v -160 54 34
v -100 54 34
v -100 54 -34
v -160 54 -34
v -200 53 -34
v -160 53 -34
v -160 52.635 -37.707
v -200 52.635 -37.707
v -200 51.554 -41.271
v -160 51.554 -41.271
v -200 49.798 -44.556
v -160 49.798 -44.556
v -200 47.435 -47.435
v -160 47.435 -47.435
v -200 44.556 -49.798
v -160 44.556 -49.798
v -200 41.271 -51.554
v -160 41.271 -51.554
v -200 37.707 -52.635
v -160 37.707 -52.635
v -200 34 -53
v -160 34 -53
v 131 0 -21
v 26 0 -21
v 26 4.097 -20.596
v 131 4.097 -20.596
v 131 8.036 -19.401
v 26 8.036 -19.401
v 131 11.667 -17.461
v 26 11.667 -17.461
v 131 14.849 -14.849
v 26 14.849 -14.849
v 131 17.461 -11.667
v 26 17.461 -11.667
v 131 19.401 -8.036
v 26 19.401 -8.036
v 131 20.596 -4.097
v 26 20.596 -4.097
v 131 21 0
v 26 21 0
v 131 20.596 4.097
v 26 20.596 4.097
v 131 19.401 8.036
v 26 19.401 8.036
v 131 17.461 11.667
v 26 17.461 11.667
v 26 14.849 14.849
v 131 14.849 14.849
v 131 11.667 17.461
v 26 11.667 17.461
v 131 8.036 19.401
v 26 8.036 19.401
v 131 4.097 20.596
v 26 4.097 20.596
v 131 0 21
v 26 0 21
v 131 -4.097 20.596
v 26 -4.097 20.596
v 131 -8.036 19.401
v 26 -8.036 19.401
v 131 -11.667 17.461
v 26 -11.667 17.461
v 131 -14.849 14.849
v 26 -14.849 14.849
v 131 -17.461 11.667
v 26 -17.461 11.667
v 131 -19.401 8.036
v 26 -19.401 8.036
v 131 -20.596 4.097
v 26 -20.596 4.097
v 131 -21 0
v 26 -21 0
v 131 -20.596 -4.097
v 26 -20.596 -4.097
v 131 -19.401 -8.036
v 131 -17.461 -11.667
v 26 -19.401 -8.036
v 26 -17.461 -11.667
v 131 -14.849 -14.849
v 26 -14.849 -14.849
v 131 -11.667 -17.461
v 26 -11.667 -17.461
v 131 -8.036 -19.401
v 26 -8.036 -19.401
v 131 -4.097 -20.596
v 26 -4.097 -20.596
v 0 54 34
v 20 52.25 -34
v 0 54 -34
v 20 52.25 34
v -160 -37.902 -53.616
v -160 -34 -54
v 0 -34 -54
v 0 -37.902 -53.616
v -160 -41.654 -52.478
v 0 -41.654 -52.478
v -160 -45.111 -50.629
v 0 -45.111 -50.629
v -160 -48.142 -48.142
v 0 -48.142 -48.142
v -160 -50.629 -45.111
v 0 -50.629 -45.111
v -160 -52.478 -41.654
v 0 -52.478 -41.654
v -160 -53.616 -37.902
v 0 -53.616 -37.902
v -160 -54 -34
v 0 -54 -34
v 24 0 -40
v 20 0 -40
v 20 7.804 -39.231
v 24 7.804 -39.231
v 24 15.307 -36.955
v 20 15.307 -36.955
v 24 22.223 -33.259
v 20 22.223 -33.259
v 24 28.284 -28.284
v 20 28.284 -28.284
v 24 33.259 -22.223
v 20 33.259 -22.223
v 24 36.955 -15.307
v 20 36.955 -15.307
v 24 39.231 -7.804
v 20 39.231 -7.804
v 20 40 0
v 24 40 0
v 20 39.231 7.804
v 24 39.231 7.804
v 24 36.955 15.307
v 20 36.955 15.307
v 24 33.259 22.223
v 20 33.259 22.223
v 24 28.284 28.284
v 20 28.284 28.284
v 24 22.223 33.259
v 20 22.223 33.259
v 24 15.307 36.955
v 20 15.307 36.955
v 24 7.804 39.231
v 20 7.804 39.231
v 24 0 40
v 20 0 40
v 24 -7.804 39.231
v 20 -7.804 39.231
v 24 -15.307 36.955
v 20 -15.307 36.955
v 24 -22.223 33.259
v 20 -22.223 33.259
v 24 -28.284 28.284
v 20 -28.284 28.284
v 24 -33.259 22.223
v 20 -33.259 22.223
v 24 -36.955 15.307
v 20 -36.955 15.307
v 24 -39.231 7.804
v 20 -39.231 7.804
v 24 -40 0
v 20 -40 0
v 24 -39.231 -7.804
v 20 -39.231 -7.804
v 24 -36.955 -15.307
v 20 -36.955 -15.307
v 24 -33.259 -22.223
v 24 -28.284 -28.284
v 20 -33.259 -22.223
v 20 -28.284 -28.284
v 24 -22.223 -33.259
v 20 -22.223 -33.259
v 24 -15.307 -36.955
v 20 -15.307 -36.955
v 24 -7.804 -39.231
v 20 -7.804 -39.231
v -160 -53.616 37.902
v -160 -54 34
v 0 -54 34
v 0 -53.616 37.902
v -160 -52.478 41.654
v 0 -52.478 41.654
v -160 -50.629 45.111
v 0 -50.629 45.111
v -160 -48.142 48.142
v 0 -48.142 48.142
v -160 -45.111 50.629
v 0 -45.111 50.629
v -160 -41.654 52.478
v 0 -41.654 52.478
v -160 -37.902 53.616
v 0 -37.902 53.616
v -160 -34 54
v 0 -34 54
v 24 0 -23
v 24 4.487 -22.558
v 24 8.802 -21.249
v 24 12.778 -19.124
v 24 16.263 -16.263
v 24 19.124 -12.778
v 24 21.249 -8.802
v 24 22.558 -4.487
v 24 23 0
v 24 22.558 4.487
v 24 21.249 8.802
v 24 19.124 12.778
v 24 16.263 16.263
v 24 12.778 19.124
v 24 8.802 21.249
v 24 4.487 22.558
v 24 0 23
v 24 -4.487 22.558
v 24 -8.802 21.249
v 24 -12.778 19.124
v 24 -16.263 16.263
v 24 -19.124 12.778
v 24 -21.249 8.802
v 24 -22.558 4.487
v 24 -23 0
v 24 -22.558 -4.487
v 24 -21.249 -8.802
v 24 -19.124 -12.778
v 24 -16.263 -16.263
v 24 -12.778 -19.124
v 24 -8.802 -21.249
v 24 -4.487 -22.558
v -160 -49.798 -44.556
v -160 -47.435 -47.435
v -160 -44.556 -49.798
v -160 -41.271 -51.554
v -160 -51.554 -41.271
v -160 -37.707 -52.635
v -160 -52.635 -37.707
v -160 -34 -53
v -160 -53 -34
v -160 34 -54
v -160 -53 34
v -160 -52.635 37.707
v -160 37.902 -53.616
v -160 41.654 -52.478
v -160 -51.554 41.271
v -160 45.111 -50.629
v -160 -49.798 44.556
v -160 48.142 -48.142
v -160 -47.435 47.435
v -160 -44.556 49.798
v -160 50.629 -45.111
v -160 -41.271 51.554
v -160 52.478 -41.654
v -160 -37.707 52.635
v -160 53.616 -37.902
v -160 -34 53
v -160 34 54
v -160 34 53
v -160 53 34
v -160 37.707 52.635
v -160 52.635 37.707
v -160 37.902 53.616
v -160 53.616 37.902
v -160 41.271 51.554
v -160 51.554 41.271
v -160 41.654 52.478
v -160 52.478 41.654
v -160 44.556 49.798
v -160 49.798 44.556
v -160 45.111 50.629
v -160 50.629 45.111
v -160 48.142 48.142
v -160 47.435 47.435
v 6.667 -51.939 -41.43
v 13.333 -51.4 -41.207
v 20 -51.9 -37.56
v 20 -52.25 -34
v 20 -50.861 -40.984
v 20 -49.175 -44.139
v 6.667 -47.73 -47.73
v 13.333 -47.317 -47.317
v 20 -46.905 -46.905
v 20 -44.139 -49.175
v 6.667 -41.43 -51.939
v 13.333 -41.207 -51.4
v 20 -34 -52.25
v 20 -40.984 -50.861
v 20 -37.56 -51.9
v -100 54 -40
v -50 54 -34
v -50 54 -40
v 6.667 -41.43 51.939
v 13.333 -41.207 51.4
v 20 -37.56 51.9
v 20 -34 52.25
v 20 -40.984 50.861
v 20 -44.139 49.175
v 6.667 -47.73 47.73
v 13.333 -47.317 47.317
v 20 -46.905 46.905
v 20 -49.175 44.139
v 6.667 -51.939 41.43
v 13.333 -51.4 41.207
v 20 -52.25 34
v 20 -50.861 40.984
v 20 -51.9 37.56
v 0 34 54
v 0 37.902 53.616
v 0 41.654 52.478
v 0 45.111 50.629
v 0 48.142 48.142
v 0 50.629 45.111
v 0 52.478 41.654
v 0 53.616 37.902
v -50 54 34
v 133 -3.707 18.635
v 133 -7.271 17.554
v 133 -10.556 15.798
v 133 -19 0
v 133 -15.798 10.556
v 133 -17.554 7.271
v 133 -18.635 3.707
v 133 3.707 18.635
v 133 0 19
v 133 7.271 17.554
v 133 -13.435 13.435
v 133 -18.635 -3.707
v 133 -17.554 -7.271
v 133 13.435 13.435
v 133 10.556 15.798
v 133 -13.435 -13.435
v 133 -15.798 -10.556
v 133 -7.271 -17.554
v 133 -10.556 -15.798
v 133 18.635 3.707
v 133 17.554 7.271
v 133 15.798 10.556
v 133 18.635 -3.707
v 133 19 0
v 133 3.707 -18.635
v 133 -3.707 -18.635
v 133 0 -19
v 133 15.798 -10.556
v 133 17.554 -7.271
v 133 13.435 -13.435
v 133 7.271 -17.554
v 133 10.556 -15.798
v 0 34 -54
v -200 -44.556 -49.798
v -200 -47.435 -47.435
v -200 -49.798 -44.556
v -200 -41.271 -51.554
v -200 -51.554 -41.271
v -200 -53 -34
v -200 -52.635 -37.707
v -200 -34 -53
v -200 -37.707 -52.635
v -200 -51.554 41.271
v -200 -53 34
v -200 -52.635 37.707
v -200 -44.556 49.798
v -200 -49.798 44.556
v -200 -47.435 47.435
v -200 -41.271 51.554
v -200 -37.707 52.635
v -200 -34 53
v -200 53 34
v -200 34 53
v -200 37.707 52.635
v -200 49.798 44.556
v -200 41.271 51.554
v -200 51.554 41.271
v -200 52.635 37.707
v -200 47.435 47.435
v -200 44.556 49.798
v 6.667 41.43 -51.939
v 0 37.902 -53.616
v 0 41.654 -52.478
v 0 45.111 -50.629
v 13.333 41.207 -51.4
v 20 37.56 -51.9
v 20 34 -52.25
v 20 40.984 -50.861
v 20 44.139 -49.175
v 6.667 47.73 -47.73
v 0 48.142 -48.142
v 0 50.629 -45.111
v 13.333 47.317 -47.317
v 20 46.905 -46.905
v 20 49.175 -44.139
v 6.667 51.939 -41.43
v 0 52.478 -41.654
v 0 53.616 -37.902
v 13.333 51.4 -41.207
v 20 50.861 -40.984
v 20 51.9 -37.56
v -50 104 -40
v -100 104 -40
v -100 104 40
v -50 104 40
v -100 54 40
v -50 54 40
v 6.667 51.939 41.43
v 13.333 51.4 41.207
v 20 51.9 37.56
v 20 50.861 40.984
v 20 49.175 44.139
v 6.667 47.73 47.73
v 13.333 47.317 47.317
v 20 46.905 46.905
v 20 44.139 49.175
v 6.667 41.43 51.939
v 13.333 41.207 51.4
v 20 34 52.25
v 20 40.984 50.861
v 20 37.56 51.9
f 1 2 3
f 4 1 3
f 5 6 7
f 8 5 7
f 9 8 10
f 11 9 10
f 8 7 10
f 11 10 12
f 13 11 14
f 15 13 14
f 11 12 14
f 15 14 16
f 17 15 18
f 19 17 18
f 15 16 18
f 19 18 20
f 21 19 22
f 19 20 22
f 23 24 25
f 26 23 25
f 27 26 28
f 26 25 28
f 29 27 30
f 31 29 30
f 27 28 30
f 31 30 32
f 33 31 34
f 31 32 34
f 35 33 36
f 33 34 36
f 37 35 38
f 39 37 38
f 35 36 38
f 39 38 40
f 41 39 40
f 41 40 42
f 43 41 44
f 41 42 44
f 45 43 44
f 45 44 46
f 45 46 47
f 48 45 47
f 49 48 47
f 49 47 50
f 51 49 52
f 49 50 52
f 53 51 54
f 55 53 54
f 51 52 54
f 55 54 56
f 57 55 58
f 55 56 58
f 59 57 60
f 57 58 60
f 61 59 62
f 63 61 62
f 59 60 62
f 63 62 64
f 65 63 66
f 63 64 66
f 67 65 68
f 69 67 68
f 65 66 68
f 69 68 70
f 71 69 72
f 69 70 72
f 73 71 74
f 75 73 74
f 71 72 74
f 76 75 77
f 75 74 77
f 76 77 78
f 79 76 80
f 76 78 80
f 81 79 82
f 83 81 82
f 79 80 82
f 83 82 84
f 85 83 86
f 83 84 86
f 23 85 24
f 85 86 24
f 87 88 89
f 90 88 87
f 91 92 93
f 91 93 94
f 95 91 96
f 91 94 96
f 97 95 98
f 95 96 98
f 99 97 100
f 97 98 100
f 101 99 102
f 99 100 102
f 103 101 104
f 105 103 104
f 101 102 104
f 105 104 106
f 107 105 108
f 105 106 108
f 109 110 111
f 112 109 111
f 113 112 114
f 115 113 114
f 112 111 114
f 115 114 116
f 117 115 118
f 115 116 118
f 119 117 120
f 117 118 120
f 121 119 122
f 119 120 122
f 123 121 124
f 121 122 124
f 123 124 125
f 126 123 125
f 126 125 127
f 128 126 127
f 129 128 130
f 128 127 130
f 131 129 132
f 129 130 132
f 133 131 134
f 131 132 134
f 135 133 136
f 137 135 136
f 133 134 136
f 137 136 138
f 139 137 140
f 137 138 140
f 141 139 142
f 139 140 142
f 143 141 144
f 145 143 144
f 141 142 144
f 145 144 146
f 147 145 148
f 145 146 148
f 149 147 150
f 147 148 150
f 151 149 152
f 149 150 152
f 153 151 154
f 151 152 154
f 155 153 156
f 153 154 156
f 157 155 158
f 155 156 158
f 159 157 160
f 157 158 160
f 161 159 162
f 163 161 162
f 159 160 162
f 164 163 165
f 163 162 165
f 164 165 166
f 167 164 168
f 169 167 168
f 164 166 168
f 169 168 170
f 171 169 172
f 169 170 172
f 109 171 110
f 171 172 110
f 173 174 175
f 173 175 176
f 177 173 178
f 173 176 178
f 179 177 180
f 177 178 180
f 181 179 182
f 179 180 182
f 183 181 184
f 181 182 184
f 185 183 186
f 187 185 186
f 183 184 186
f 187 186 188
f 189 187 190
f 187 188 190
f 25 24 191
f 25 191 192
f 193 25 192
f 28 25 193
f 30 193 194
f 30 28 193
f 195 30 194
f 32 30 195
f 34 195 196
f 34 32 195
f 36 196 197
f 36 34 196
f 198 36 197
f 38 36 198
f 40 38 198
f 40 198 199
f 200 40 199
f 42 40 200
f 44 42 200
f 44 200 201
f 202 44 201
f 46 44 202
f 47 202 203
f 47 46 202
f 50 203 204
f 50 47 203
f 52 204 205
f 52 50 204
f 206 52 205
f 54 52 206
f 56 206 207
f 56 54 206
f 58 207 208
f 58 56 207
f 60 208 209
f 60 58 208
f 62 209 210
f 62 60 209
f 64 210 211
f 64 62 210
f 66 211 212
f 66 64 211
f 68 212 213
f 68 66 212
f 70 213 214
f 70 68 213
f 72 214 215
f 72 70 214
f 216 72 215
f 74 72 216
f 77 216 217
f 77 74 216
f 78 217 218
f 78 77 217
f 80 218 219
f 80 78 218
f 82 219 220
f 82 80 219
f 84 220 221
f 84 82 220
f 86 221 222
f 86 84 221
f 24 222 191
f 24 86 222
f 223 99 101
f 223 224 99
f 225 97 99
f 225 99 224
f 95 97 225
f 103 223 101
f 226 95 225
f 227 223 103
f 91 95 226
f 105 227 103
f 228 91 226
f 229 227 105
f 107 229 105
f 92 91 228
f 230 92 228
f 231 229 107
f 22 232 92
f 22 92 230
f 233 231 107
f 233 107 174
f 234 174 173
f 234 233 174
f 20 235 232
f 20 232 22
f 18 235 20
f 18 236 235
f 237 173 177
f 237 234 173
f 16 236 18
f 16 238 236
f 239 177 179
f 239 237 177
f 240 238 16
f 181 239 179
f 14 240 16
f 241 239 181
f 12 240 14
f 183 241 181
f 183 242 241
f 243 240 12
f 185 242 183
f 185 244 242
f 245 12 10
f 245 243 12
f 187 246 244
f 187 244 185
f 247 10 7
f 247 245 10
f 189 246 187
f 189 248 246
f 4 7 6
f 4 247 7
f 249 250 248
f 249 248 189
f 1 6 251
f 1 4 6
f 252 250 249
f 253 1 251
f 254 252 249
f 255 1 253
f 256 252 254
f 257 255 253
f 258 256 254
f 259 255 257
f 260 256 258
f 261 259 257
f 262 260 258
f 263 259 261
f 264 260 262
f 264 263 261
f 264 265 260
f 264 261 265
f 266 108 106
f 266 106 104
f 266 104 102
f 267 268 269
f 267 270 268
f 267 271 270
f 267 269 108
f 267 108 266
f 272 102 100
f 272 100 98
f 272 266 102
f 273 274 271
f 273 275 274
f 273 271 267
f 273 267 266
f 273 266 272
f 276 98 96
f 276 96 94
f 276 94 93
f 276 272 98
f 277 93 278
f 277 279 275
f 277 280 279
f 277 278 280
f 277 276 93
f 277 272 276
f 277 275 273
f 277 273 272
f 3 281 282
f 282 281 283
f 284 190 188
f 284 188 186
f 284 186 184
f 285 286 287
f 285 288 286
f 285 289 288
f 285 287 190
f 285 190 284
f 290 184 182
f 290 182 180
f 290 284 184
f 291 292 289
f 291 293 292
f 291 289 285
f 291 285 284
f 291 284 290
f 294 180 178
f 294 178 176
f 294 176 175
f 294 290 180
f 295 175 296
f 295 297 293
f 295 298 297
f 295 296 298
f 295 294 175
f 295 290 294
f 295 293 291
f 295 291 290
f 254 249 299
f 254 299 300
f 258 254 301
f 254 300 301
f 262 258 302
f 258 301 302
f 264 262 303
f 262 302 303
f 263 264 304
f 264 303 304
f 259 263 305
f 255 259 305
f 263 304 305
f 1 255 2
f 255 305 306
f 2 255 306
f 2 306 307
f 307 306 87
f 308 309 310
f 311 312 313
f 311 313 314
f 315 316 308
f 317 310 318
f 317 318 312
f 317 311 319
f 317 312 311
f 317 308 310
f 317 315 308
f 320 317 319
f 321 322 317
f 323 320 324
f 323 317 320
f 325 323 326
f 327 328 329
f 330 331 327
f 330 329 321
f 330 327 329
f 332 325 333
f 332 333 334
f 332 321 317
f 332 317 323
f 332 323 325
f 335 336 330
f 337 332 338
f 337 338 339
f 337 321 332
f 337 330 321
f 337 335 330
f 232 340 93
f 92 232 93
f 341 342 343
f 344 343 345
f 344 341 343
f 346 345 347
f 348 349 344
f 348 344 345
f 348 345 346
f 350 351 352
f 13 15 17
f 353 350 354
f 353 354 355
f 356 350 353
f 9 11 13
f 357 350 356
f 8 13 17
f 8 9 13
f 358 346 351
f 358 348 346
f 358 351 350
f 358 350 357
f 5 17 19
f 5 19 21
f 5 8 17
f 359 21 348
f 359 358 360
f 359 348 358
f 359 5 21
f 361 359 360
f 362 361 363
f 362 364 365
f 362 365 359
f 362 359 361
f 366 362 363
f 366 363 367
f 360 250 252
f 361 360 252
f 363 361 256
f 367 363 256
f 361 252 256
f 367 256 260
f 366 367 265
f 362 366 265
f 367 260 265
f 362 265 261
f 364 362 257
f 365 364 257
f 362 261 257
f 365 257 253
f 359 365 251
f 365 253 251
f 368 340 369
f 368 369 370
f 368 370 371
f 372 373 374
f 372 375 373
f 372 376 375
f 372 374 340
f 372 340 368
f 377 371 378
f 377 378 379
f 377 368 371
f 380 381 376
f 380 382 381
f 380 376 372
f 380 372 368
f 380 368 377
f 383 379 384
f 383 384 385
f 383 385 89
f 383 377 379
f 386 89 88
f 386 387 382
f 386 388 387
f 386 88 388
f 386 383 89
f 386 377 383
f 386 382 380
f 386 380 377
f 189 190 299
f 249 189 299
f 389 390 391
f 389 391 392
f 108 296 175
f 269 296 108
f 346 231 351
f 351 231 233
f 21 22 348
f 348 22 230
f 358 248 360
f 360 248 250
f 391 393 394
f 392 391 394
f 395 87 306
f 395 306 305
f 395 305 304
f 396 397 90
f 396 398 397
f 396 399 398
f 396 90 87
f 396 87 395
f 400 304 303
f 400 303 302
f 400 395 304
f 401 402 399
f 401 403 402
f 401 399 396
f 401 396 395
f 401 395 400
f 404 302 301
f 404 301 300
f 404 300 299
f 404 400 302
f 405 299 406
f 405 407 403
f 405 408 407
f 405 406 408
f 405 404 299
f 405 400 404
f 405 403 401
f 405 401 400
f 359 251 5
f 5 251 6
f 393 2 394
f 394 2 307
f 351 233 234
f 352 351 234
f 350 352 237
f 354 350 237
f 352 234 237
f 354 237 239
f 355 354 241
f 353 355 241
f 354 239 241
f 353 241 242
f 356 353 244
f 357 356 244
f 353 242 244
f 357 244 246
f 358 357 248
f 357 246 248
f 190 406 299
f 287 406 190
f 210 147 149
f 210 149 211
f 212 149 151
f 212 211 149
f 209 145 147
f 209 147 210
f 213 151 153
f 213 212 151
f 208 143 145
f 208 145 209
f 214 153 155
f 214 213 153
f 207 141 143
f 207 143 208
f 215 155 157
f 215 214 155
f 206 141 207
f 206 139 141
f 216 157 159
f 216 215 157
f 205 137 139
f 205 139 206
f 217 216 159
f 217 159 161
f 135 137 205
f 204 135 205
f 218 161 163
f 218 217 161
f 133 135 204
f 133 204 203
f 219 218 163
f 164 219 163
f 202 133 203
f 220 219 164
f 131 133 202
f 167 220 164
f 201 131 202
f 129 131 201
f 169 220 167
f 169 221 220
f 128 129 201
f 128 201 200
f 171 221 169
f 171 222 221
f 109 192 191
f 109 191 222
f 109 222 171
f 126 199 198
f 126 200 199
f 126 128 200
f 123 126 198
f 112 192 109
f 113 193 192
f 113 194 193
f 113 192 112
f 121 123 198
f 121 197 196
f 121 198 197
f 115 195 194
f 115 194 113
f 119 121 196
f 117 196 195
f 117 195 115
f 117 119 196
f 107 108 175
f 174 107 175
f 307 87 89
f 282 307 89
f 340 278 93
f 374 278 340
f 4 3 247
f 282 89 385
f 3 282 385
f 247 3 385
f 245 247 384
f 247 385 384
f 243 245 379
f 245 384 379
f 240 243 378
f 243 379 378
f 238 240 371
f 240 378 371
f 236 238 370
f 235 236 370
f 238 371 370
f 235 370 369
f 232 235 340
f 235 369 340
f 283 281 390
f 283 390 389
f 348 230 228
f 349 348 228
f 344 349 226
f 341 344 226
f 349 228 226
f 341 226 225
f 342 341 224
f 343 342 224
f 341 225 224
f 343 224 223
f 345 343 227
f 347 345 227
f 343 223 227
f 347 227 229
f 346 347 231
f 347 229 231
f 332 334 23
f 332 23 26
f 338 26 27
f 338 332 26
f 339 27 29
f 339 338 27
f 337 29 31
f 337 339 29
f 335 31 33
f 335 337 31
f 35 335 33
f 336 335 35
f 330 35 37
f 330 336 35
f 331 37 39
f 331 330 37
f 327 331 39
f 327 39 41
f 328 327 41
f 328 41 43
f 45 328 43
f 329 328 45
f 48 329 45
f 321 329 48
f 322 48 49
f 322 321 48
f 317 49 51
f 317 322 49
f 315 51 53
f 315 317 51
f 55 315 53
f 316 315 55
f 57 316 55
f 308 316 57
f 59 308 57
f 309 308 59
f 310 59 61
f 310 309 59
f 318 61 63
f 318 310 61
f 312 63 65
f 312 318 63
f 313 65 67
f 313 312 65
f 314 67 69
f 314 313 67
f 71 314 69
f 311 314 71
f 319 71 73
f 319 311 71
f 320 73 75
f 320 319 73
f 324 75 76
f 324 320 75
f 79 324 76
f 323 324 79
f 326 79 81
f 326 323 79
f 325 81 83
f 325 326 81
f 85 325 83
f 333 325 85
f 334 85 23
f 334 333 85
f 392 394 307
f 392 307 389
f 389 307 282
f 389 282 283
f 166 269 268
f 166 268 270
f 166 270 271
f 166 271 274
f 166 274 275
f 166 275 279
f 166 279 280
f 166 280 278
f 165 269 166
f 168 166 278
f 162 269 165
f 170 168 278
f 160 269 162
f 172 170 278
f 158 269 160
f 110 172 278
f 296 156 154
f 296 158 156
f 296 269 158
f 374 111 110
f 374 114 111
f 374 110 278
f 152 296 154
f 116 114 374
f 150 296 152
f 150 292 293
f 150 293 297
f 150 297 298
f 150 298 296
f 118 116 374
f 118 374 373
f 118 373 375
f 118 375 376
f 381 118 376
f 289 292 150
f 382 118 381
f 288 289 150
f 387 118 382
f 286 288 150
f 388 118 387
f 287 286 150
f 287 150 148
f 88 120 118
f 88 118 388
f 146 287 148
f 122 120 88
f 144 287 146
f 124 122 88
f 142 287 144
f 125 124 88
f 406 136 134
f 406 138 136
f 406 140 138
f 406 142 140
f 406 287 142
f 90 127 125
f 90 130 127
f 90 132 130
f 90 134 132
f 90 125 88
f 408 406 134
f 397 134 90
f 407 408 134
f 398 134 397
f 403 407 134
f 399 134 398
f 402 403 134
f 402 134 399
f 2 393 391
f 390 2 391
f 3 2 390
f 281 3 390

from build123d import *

# Parameters (mm, degrees)
EXTRUDE_1_DEPTH = 20
EXTRUDE_1_TAPER = 5
SKETCH_2_R      = 40
EXTRUDE_2_DEPTH = 4
SKETCH_3_R      = 21
EXTRUDE_3_DEPTH = 109
CHAMFER_1_SIZE  = 2
CHAMFER_2_SIZE  = 2
EXTRUDE_5_DEPTH = 160
SKETCH_7_W      = 50
SKETCH_7_H      = 80
EXTRUDE_6_DEPTH = 50
EXTRUDE_7_DEPTH = 40


with BuildPart() as part:
    # 草圖1 → 伸長1 (new body)
    with BuildSketch(Plane(origin=(0, 0, 0), x_dir=(0, 0, -1), z_dir=(1, 0, 0))):
        with BuildLine():
            ThreePointArc((-34, 54), (-48.142135624, 48.142135624), (-54, 34))
            Line((-54, 34), (-54, -34))
            ThreePointArc((-54, -34), (-48.142135624, -48.142135624), (-34, -54))
            Line((-34, -54), (34, -54))
            ThreePointArc((34, -54), (48.142135624, -48.142135624), (54, -34))
            Line((54, -34), (54, 34))
            ThreePointArc((54, 34), (48.142135624, 48.142135624), (34, 54))
            Line((34, 54), (-34, 54))
        make_face()
    extrude(amount=EXTRUDE_1_DEPTH, taper=EXTRUDE_1_TAPER)

    # 草圖2 → 伸長2 (add)
    with BuildSketch(Plane(origin=(20, 0, 0), x_dir=(0, 0, -1), z_dir=(1, 0, 0))):
        Circle(SKETCH_2_R)
    extrude(amount=EXTRUDE_2_DEPTH)

    # 草圖3 → 伸長3 (add)
    with BuildSketch(Plane(origin=(24, 0, 0), x_dir=(0, 0, -1), z_dir=(1, 0, 0))):
        Circle(SKETCH_3_R)
    extrude(amount=EXTRUDE_3_DEPTH)

    # 導角1
    chamfer_1_edges = [part.edges().sort_by_distance(p)[0] for p in [
        (24, 0, 21),
    ]]
    chamfer(chamfer_1_edges, length=CHAMFER_1_SIZE)

    # 導角2
    chamfer_2_edges = [part.edges().sort_by_distance(p)[0] for p in [
        (133, 0, 21),
    ]]
    chamfer(chamfer_2_edges, length=CHAMFER_2_SIZE)

    # 草圖6 → 伸長5 (add)
    with BuildSketch(Plane.ZY):
        with BuildLine():
            Line((-54, 34), (-54, -34))
            ThreePointArc((-54, -34), (-48.142135624, -48.142135624), (-34, -54))
            Line((-34, -54), (34, -54))
            ThreePointArc((34, -54), (48.142135624, -48.142135624), (54, -34))
            Line((54, -34), (54, 34))
            ThreePointArc((54, 34), (48.142135624, 48.142135624), (34, 54))
            Line((34, 54), (-34, 54))
            ThreePointArc((-34, 54), (-48.142135624, 48.142135624), (-54, 34))
        make_face()
    extrude(amount=EXTRUDE_5_DEPTH)

    # 草圖7 → 伸長6 (add)
    with BuildSketch(Plane(origin=(0, 54, 0), x_dir=(1, 0, 0), z_dir=(0, 1, 0))):
        with Locations((-75, 0)):
            Rectangle(SKETCH_7_W, SKETCH_7_H)
    extrude(amount=EXTRUDE_6_DEPTH)

    # 草圖8 → 伸長7 (add)
    with BuildSketch(Plane.ZY.offset(160)):
        with BuildLine():
            Line((-53, 34), (-53, -34))
            ThreePointArc((-53, -34), (-47.435028843, -47.435028843), (-34, -53))
            Line((-34, -53), (34, -53))
            ThreePointArc((34, -53), (47.435028843, -47.435028843), (53, -34))
            Line((53, -34), (53, 34))
            ThreePointArc((53, 34), (47.435028843, 47.435028843), (34, 53))
            Line((34, 53), (-34, 53))
            ThreePointArc((-34, 53), (-47.435028843, 47.435028843), (-53, 34))
        make_face()
    extrude(amount=EXTRUDE_7_DEPTH)


solid = part.part
